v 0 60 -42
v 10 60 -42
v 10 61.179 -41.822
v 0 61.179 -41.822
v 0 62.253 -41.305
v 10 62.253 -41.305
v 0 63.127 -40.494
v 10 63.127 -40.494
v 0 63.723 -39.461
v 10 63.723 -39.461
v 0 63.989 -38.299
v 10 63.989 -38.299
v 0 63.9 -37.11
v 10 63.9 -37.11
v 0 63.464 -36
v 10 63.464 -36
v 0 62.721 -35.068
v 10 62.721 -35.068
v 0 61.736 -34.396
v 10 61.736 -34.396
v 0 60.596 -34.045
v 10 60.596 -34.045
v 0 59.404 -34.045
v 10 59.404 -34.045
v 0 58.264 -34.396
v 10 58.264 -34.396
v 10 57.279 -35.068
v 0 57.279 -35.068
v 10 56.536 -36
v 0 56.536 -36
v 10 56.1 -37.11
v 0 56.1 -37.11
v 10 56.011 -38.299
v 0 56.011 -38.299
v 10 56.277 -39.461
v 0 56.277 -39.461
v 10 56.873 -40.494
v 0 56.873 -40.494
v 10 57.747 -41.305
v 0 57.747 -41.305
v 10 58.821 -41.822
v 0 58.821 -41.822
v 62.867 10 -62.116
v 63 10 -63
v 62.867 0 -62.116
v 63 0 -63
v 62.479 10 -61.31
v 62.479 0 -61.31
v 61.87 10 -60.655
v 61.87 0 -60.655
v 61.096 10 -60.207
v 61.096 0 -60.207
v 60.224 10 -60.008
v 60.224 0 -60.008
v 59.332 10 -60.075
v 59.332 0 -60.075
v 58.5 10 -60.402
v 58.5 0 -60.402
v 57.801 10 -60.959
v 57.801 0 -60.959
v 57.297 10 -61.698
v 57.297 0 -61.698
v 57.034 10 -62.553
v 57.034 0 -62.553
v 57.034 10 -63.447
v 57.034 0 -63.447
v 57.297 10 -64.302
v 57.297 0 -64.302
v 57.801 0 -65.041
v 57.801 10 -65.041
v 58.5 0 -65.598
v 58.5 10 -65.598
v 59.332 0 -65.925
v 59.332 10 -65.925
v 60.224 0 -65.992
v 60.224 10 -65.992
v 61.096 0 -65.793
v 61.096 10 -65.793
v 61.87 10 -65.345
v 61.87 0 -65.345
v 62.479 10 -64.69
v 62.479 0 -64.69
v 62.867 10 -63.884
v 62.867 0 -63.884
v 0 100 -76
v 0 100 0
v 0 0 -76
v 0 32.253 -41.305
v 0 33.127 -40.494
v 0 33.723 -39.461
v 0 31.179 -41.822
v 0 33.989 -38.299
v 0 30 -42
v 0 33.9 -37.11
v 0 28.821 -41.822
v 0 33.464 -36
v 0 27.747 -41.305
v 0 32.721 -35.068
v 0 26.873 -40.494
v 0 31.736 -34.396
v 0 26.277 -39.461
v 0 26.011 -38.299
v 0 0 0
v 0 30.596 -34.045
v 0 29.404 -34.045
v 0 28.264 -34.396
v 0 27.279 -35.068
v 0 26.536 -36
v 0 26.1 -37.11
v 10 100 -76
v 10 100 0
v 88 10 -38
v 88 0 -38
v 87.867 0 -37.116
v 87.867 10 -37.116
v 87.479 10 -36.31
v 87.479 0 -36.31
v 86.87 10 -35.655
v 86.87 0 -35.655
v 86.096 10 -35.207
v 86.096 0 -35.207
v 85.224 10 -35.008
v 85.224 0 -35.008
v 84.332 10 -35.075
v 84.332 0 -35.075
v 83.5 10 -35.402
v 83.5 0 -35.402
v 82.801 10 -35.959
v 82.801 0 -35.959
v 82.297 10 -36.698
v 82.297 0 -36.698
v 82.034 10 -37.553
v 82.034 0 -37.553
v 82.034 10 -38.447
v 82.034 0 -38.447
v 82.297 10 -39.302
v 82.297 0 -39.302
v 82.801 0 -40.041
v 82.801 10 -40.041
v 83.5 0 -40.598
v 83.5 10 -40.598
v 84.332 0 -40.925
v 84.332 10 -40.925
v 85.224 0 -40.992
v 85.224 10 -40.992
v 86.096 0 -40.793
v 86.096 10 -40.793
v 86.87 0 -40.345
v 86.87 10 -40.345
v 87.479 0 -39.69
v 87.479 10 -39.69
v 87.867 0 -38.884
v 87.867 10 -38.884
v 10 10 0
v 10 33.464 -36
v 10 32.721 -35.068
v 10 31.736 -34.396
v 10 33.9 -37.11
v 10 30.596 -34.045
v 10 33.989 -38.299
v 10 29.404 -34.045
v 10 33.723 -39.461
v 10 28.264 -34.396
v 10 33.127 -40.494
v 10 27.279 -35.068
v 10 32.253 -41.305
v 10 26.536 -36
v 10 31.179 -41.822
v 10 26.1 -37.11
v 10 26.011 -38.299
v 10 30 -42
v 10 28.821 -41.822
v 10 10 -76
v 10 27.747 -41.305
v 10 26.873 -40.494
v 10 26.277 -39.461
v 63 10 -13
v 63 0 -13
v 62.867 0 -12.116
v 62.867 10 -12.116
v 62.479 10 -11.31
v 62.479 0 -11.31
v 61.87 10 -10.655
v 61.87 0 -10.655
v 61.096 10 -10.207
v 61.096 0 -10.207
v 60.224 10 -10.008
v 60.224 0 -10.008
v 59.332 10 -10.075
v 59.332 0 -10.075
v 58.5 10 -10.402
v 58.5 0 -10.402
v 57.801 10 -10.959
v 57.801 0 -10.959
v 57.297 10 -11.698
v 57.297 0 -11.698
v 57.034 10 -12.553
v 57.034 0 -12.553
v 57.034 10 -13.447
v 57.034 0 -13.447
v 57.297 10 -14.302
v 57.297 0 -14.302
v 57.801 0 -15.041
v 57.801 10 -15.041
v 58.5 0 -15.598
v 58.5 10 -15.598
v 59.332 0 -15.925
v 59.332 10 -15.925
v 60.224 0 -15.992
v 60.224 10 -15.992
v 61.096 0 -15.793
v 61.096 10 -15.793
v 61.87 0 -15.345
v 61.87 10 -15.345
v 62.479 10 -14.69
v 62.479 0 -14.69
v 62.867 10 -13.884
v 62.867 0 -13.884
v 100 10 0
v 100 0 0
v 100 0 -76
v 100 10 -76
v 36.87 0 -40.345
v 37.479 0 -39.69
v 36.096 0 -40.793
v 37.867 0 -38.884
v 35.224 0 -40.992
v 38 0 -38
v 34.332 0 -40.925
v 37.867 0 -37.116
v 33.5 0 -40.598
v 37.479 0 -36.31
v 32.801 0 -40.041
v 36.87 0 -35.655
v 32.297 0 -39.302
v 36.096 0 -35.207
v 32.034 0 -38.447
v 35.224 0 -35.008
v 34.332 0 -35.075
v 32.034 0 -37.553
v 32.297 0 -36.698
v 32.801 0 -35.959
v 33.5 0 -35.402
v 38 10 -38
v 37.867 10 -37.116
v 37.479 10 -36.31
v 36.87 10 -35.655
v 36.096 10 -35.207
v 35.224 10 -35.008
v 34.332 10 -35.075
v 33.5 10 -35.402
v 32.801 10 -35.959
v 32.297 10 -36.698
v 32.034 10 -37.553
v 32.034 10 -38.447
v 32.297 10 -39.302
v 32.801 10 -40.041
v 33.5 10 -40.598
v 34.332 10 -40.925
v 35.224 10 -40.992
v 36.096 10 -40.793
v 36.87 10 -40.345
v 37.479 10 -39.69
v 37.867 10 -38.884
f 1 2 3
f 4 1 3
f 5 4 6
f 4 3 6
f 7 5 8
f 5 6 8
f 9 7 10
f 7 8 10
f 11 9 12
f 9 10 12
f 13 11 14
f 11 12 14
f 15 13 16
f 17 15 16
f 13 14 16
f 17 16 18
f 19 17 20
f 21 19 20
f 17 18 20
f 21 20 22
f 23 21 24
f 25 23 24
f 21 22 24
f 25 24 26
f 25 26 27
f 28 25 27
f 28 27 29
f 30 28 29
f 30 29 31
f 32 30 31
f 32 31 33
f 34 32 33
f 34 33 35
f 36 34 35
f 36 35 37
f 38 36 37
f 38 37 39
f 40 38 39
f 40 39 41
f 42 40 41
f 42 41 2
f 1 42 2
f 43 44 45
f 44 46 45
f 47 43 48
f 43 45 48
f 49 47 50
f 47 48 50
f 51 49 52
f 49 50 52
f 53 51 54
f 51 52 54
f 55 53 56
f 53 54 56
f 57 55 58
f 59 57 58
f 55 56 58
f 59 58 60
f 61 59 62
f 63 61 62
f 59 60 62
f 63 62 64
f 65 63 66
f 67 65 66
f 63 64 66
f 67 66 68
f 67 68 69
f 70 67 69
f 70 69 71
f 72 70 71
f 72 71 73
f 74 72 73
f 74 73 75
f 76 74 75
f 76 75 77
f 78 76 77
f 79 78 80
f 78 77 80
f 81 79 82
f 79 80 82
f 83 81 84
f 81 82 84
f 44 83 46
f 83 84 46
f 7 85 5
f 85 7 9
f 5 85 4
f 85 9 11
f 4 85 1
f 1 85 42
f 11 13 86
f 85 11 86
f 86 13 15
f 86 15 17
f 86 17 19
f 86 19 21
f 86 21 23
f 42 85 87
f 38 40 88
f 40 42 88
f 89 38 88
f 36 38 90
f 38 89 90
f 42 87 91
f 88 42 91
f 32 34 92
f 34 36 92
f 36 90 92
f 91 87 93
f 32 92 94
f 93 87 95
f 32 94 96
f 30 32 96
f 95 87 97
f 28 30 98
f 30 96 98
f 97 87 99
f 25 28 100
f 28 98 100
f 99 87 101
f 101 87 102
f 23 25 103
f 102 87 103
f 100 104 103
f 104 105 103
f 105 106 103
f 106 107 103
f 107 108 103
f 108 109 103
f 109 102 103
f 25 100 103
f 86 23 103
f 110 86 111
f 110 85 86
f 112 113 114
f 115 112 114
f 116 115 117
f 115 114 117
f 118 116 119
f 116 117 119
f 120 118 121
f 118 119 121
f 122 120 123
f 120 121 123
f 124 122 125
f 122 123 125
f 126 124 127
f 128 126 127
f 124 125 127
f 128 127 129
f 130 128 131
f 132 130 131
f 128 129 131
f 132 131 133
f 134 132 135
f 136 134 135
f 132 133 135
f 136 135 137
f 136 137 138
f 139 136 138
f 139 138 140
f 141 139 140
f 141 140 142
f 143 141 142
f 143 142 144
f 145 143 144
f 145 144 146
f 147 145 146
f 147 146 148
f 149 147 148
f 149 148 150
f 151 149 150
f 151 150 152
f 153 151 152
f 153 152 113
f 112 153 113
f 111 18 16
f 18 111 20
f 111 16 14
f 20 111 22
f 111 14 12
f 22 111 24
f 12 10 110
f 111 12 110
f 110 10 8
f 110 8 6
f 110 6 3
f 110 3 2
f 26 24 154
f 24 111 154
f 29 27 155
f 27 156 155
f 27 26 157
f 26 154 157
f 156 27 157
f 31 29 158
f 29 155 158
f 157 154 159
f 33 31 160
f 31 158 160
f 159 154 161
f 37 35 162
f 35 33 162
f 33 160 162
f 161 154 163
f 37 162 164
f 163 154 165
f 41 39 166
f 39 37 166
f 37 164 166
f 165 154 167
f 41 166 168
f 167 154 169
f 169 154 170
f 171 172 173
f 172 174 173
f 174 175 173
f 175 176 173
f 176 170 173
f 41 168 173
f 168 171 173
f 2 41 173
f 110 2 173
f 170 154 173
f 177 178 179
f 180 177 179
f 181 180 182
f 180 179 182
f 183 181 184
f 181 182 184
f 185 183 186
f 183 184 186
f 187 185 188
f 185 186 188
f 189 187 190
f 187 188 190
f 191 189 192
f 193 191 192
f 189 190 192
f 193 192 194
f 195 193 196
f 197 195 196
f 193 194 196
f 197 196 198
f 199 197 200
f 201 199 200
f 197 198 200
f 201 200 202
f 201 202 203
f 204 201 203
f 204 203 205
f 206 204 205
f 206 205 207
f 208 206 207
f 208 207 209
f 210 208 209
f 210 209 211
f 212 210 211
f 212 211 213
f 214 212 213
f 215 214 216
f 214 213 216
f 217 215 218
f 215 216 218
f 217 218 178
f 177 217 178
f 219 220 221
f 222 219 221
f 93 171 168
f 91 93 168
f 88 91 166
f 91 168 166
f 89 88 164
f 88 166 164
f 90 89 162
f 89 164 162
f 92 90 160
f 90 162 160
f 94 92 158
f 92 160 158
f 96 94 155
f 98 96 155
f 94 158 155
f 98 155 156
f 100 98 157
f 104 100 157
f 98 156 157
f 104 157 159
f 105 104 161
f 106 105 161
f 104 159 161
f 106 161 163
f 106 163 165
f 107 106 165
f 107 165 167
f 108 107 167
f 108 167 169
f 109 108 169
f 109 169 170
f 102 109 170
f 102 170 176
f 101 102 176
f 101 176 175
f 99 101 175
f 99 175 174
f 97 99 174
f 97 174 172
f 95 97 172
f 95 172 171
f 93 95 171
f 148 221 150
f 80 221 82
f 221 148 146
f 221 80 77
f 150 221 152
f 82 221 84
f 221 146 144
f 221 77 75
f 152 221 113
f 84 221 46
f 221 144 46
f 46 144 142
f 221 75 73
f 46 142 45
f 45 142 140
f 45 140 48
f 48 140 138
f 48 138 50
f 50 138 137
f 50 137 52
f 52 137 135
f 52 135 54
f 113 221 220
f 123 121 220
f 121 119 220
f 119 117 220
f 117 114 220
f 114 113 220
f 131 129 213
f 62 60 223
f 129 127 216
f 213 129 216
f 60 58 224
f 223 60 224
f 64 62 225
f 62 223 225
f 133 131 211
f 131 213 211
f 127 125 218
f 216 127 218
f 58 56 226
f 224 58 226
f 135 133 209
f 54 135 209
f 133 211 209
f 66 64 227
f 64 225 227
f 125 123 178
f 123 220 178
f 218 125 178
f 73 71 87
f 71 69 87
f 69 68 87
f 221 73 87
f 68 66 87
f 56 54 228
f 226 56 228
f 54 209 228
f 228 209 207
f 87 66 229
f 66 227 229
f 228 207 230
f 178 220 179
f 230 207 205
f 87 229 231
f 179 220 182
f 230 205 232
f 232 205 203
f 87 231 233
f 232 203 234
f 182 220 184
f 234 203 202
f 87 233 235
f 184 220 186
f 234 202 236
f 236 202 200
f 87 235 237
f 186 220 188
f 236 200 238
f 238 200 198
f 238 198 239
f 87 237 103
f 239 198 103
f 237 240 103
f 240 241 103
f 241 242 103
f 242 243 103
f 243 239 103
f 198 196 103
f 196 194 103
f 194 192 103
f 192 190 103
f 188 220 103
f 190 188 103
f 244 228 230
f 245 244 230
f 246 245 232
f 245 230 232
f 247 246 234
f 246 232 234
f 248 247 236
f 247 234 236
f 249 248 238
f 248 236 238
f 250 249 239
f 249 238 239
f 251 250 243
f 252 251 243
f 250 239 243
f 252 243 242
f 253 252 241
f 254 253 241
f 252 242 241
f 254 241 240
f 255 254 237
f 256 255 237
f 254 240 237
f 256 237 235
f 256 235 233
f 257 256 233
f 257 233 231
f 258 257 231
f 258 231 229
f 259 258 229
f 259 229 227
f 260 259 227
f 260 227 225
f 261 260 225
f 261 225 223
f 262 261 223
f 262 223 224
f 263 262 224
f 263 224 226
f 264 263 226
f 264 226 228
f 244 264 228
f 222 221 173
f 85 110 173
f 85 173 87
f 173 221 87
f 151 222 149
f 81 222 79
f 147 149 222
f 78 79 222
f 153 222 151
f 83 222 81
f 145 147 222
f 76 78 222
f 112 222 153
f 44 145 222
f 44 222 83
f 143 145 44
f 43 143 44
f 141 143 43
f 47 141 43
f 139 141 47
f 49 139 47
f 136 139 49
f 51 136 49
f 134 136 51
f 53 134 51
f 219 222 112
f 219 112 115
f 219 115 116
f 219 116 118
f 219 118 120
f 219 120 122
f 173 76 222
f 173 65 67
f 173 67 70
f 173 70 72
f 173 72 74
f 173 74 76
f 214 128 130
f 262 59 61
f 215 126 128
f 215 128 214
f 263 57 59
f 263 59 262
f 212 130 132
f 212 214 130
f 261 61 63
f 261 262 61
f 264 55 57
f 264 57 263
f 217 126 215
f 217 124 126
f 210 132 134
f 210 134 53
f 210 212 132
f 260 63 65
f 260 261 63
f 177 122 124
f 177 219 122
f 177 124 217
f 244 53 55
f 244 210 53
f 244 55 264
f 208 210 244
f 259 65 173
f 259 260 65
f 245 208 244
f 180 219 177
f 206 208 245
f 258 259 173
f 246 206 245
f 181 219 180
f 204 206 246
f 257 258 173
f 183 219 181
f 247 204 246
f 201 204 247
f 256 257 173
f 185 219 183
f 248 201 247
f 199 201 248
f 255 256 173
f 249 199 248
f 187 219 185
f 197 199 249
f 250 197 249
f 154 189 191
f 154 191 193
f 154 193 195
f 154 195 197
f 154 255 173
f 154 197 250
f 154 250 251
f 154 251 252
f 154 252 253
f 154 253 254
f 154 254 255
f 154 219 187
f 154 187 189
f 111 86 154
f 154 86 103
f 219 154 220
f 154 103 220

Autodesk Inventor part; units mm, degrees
ref_plane "YZ Plane" through (0, 0, 0) normal (1, 0, 0) x (0, 1, 0)
ref_plane "XZ Plane" through (0, 0, 0) normal (0, 1, 0) x (-1, 0, 0)
ref_plane "XY Plane" through (0, 0, 0) normal (0, 0, 1) x (1, 0, 0)
sketch "Sketch1" plane through (0, 0, 0) normal (0, 1, 0) x (-1, 0, 0)
  line L0 (0, 0) -> (-100, 0)
  line L1 (-100, 0) -> (-100, -76)
  line L2 (-100, -76) -> (0, -76)
  line L3 (0, -76) -> (0, 0)
  dimension "d0" = 100
  dimension "d1" = 76
extrude "Extrusion1" add sketch "Sketch1" along normal blind 10
sketch "Sketch2" plane through (0, 10, 0) normal (0, 1, 0) x (1, 0, 0)
  line L0 (0, 0) -> (100, 0) projected
  line L1 (100, 76) -> (0, 76) projected
  line L2 (0, 0) -> (10, 0)
  line L3 (10, 0) -> (10, 76)
  line L4 (10, 76) -> (0, 76)
  line L5 (0, 76) -> (0, 0)
  dimension "d4" = 10
extrude "Extrusion2" add sketch "Sketch2" along normal blind 90
sketch "Sketch3" plane through (10, 10, 0) normal (1, 0, 0) x (0, 0, -1)
  line L0 (0, -10) -> (76, -10) projected
  line L1 (0, -10) -> (38, -10)
  line L2 (38, -10) -> (38, 20)
  circle A0 centre (38, 20) radius 4
  line L3 (38, 20) -> (38, 50)
  circle A1 centre (38, 50) radius 4
  dimension "d7" = 30
  dimension "d8" = 8
  dimension "d9" = 30
  dimension "d10" = 8
sketch "Sketch4" plane through (0, 0, -76) normal (-1, 0, 0) x (0, 0, 1)
  circle A0 centre (38, 30) radius 4
  circle A1 centre (38, 60) radius 4
  point P0 (76, 0)
  dimension "d15" = 8
  dimension "d16" = 8
extrude "Extrusion3" cut sketch "Sketch3" against normal blind 10
sketch "Sketch5" plane through (0, 0, 0) normal (0, -1, 0) x (1, 0, 0)
  line L0 (0, -76) -> (0, 0) projected
  line L1 (0, -38) -> (60, -38)
  line L2 (100, 0) -> (100, -76) projected
  line L3 (60, -38) -> (60, -63)
  line L4 (60, -38) -> (60, -13)
  line L5 (60, -38) -> (35, -38)
  line L6 (60, -38) -> (85, -38)
  circle A0 centre (60, -63) radius 3
  circle A1 centre (85, -38) radius 3
  circle A2 centre (60, -13) radius 3
  circle A3 centre (35, -38) radius 3
  dimension "d19" = 60
  dimension "d20" = 25
  dimension "d21" = 25
  dimension "d22" = 25
  dimension "d23" = 25
  dimension "d24" = 6
  dimension "d25" = 6
  dimension "d26" = 6
  dimension "d27" = 6
extrude "Extrusion4" cut sketch "Sketch5" against normal blind 10
